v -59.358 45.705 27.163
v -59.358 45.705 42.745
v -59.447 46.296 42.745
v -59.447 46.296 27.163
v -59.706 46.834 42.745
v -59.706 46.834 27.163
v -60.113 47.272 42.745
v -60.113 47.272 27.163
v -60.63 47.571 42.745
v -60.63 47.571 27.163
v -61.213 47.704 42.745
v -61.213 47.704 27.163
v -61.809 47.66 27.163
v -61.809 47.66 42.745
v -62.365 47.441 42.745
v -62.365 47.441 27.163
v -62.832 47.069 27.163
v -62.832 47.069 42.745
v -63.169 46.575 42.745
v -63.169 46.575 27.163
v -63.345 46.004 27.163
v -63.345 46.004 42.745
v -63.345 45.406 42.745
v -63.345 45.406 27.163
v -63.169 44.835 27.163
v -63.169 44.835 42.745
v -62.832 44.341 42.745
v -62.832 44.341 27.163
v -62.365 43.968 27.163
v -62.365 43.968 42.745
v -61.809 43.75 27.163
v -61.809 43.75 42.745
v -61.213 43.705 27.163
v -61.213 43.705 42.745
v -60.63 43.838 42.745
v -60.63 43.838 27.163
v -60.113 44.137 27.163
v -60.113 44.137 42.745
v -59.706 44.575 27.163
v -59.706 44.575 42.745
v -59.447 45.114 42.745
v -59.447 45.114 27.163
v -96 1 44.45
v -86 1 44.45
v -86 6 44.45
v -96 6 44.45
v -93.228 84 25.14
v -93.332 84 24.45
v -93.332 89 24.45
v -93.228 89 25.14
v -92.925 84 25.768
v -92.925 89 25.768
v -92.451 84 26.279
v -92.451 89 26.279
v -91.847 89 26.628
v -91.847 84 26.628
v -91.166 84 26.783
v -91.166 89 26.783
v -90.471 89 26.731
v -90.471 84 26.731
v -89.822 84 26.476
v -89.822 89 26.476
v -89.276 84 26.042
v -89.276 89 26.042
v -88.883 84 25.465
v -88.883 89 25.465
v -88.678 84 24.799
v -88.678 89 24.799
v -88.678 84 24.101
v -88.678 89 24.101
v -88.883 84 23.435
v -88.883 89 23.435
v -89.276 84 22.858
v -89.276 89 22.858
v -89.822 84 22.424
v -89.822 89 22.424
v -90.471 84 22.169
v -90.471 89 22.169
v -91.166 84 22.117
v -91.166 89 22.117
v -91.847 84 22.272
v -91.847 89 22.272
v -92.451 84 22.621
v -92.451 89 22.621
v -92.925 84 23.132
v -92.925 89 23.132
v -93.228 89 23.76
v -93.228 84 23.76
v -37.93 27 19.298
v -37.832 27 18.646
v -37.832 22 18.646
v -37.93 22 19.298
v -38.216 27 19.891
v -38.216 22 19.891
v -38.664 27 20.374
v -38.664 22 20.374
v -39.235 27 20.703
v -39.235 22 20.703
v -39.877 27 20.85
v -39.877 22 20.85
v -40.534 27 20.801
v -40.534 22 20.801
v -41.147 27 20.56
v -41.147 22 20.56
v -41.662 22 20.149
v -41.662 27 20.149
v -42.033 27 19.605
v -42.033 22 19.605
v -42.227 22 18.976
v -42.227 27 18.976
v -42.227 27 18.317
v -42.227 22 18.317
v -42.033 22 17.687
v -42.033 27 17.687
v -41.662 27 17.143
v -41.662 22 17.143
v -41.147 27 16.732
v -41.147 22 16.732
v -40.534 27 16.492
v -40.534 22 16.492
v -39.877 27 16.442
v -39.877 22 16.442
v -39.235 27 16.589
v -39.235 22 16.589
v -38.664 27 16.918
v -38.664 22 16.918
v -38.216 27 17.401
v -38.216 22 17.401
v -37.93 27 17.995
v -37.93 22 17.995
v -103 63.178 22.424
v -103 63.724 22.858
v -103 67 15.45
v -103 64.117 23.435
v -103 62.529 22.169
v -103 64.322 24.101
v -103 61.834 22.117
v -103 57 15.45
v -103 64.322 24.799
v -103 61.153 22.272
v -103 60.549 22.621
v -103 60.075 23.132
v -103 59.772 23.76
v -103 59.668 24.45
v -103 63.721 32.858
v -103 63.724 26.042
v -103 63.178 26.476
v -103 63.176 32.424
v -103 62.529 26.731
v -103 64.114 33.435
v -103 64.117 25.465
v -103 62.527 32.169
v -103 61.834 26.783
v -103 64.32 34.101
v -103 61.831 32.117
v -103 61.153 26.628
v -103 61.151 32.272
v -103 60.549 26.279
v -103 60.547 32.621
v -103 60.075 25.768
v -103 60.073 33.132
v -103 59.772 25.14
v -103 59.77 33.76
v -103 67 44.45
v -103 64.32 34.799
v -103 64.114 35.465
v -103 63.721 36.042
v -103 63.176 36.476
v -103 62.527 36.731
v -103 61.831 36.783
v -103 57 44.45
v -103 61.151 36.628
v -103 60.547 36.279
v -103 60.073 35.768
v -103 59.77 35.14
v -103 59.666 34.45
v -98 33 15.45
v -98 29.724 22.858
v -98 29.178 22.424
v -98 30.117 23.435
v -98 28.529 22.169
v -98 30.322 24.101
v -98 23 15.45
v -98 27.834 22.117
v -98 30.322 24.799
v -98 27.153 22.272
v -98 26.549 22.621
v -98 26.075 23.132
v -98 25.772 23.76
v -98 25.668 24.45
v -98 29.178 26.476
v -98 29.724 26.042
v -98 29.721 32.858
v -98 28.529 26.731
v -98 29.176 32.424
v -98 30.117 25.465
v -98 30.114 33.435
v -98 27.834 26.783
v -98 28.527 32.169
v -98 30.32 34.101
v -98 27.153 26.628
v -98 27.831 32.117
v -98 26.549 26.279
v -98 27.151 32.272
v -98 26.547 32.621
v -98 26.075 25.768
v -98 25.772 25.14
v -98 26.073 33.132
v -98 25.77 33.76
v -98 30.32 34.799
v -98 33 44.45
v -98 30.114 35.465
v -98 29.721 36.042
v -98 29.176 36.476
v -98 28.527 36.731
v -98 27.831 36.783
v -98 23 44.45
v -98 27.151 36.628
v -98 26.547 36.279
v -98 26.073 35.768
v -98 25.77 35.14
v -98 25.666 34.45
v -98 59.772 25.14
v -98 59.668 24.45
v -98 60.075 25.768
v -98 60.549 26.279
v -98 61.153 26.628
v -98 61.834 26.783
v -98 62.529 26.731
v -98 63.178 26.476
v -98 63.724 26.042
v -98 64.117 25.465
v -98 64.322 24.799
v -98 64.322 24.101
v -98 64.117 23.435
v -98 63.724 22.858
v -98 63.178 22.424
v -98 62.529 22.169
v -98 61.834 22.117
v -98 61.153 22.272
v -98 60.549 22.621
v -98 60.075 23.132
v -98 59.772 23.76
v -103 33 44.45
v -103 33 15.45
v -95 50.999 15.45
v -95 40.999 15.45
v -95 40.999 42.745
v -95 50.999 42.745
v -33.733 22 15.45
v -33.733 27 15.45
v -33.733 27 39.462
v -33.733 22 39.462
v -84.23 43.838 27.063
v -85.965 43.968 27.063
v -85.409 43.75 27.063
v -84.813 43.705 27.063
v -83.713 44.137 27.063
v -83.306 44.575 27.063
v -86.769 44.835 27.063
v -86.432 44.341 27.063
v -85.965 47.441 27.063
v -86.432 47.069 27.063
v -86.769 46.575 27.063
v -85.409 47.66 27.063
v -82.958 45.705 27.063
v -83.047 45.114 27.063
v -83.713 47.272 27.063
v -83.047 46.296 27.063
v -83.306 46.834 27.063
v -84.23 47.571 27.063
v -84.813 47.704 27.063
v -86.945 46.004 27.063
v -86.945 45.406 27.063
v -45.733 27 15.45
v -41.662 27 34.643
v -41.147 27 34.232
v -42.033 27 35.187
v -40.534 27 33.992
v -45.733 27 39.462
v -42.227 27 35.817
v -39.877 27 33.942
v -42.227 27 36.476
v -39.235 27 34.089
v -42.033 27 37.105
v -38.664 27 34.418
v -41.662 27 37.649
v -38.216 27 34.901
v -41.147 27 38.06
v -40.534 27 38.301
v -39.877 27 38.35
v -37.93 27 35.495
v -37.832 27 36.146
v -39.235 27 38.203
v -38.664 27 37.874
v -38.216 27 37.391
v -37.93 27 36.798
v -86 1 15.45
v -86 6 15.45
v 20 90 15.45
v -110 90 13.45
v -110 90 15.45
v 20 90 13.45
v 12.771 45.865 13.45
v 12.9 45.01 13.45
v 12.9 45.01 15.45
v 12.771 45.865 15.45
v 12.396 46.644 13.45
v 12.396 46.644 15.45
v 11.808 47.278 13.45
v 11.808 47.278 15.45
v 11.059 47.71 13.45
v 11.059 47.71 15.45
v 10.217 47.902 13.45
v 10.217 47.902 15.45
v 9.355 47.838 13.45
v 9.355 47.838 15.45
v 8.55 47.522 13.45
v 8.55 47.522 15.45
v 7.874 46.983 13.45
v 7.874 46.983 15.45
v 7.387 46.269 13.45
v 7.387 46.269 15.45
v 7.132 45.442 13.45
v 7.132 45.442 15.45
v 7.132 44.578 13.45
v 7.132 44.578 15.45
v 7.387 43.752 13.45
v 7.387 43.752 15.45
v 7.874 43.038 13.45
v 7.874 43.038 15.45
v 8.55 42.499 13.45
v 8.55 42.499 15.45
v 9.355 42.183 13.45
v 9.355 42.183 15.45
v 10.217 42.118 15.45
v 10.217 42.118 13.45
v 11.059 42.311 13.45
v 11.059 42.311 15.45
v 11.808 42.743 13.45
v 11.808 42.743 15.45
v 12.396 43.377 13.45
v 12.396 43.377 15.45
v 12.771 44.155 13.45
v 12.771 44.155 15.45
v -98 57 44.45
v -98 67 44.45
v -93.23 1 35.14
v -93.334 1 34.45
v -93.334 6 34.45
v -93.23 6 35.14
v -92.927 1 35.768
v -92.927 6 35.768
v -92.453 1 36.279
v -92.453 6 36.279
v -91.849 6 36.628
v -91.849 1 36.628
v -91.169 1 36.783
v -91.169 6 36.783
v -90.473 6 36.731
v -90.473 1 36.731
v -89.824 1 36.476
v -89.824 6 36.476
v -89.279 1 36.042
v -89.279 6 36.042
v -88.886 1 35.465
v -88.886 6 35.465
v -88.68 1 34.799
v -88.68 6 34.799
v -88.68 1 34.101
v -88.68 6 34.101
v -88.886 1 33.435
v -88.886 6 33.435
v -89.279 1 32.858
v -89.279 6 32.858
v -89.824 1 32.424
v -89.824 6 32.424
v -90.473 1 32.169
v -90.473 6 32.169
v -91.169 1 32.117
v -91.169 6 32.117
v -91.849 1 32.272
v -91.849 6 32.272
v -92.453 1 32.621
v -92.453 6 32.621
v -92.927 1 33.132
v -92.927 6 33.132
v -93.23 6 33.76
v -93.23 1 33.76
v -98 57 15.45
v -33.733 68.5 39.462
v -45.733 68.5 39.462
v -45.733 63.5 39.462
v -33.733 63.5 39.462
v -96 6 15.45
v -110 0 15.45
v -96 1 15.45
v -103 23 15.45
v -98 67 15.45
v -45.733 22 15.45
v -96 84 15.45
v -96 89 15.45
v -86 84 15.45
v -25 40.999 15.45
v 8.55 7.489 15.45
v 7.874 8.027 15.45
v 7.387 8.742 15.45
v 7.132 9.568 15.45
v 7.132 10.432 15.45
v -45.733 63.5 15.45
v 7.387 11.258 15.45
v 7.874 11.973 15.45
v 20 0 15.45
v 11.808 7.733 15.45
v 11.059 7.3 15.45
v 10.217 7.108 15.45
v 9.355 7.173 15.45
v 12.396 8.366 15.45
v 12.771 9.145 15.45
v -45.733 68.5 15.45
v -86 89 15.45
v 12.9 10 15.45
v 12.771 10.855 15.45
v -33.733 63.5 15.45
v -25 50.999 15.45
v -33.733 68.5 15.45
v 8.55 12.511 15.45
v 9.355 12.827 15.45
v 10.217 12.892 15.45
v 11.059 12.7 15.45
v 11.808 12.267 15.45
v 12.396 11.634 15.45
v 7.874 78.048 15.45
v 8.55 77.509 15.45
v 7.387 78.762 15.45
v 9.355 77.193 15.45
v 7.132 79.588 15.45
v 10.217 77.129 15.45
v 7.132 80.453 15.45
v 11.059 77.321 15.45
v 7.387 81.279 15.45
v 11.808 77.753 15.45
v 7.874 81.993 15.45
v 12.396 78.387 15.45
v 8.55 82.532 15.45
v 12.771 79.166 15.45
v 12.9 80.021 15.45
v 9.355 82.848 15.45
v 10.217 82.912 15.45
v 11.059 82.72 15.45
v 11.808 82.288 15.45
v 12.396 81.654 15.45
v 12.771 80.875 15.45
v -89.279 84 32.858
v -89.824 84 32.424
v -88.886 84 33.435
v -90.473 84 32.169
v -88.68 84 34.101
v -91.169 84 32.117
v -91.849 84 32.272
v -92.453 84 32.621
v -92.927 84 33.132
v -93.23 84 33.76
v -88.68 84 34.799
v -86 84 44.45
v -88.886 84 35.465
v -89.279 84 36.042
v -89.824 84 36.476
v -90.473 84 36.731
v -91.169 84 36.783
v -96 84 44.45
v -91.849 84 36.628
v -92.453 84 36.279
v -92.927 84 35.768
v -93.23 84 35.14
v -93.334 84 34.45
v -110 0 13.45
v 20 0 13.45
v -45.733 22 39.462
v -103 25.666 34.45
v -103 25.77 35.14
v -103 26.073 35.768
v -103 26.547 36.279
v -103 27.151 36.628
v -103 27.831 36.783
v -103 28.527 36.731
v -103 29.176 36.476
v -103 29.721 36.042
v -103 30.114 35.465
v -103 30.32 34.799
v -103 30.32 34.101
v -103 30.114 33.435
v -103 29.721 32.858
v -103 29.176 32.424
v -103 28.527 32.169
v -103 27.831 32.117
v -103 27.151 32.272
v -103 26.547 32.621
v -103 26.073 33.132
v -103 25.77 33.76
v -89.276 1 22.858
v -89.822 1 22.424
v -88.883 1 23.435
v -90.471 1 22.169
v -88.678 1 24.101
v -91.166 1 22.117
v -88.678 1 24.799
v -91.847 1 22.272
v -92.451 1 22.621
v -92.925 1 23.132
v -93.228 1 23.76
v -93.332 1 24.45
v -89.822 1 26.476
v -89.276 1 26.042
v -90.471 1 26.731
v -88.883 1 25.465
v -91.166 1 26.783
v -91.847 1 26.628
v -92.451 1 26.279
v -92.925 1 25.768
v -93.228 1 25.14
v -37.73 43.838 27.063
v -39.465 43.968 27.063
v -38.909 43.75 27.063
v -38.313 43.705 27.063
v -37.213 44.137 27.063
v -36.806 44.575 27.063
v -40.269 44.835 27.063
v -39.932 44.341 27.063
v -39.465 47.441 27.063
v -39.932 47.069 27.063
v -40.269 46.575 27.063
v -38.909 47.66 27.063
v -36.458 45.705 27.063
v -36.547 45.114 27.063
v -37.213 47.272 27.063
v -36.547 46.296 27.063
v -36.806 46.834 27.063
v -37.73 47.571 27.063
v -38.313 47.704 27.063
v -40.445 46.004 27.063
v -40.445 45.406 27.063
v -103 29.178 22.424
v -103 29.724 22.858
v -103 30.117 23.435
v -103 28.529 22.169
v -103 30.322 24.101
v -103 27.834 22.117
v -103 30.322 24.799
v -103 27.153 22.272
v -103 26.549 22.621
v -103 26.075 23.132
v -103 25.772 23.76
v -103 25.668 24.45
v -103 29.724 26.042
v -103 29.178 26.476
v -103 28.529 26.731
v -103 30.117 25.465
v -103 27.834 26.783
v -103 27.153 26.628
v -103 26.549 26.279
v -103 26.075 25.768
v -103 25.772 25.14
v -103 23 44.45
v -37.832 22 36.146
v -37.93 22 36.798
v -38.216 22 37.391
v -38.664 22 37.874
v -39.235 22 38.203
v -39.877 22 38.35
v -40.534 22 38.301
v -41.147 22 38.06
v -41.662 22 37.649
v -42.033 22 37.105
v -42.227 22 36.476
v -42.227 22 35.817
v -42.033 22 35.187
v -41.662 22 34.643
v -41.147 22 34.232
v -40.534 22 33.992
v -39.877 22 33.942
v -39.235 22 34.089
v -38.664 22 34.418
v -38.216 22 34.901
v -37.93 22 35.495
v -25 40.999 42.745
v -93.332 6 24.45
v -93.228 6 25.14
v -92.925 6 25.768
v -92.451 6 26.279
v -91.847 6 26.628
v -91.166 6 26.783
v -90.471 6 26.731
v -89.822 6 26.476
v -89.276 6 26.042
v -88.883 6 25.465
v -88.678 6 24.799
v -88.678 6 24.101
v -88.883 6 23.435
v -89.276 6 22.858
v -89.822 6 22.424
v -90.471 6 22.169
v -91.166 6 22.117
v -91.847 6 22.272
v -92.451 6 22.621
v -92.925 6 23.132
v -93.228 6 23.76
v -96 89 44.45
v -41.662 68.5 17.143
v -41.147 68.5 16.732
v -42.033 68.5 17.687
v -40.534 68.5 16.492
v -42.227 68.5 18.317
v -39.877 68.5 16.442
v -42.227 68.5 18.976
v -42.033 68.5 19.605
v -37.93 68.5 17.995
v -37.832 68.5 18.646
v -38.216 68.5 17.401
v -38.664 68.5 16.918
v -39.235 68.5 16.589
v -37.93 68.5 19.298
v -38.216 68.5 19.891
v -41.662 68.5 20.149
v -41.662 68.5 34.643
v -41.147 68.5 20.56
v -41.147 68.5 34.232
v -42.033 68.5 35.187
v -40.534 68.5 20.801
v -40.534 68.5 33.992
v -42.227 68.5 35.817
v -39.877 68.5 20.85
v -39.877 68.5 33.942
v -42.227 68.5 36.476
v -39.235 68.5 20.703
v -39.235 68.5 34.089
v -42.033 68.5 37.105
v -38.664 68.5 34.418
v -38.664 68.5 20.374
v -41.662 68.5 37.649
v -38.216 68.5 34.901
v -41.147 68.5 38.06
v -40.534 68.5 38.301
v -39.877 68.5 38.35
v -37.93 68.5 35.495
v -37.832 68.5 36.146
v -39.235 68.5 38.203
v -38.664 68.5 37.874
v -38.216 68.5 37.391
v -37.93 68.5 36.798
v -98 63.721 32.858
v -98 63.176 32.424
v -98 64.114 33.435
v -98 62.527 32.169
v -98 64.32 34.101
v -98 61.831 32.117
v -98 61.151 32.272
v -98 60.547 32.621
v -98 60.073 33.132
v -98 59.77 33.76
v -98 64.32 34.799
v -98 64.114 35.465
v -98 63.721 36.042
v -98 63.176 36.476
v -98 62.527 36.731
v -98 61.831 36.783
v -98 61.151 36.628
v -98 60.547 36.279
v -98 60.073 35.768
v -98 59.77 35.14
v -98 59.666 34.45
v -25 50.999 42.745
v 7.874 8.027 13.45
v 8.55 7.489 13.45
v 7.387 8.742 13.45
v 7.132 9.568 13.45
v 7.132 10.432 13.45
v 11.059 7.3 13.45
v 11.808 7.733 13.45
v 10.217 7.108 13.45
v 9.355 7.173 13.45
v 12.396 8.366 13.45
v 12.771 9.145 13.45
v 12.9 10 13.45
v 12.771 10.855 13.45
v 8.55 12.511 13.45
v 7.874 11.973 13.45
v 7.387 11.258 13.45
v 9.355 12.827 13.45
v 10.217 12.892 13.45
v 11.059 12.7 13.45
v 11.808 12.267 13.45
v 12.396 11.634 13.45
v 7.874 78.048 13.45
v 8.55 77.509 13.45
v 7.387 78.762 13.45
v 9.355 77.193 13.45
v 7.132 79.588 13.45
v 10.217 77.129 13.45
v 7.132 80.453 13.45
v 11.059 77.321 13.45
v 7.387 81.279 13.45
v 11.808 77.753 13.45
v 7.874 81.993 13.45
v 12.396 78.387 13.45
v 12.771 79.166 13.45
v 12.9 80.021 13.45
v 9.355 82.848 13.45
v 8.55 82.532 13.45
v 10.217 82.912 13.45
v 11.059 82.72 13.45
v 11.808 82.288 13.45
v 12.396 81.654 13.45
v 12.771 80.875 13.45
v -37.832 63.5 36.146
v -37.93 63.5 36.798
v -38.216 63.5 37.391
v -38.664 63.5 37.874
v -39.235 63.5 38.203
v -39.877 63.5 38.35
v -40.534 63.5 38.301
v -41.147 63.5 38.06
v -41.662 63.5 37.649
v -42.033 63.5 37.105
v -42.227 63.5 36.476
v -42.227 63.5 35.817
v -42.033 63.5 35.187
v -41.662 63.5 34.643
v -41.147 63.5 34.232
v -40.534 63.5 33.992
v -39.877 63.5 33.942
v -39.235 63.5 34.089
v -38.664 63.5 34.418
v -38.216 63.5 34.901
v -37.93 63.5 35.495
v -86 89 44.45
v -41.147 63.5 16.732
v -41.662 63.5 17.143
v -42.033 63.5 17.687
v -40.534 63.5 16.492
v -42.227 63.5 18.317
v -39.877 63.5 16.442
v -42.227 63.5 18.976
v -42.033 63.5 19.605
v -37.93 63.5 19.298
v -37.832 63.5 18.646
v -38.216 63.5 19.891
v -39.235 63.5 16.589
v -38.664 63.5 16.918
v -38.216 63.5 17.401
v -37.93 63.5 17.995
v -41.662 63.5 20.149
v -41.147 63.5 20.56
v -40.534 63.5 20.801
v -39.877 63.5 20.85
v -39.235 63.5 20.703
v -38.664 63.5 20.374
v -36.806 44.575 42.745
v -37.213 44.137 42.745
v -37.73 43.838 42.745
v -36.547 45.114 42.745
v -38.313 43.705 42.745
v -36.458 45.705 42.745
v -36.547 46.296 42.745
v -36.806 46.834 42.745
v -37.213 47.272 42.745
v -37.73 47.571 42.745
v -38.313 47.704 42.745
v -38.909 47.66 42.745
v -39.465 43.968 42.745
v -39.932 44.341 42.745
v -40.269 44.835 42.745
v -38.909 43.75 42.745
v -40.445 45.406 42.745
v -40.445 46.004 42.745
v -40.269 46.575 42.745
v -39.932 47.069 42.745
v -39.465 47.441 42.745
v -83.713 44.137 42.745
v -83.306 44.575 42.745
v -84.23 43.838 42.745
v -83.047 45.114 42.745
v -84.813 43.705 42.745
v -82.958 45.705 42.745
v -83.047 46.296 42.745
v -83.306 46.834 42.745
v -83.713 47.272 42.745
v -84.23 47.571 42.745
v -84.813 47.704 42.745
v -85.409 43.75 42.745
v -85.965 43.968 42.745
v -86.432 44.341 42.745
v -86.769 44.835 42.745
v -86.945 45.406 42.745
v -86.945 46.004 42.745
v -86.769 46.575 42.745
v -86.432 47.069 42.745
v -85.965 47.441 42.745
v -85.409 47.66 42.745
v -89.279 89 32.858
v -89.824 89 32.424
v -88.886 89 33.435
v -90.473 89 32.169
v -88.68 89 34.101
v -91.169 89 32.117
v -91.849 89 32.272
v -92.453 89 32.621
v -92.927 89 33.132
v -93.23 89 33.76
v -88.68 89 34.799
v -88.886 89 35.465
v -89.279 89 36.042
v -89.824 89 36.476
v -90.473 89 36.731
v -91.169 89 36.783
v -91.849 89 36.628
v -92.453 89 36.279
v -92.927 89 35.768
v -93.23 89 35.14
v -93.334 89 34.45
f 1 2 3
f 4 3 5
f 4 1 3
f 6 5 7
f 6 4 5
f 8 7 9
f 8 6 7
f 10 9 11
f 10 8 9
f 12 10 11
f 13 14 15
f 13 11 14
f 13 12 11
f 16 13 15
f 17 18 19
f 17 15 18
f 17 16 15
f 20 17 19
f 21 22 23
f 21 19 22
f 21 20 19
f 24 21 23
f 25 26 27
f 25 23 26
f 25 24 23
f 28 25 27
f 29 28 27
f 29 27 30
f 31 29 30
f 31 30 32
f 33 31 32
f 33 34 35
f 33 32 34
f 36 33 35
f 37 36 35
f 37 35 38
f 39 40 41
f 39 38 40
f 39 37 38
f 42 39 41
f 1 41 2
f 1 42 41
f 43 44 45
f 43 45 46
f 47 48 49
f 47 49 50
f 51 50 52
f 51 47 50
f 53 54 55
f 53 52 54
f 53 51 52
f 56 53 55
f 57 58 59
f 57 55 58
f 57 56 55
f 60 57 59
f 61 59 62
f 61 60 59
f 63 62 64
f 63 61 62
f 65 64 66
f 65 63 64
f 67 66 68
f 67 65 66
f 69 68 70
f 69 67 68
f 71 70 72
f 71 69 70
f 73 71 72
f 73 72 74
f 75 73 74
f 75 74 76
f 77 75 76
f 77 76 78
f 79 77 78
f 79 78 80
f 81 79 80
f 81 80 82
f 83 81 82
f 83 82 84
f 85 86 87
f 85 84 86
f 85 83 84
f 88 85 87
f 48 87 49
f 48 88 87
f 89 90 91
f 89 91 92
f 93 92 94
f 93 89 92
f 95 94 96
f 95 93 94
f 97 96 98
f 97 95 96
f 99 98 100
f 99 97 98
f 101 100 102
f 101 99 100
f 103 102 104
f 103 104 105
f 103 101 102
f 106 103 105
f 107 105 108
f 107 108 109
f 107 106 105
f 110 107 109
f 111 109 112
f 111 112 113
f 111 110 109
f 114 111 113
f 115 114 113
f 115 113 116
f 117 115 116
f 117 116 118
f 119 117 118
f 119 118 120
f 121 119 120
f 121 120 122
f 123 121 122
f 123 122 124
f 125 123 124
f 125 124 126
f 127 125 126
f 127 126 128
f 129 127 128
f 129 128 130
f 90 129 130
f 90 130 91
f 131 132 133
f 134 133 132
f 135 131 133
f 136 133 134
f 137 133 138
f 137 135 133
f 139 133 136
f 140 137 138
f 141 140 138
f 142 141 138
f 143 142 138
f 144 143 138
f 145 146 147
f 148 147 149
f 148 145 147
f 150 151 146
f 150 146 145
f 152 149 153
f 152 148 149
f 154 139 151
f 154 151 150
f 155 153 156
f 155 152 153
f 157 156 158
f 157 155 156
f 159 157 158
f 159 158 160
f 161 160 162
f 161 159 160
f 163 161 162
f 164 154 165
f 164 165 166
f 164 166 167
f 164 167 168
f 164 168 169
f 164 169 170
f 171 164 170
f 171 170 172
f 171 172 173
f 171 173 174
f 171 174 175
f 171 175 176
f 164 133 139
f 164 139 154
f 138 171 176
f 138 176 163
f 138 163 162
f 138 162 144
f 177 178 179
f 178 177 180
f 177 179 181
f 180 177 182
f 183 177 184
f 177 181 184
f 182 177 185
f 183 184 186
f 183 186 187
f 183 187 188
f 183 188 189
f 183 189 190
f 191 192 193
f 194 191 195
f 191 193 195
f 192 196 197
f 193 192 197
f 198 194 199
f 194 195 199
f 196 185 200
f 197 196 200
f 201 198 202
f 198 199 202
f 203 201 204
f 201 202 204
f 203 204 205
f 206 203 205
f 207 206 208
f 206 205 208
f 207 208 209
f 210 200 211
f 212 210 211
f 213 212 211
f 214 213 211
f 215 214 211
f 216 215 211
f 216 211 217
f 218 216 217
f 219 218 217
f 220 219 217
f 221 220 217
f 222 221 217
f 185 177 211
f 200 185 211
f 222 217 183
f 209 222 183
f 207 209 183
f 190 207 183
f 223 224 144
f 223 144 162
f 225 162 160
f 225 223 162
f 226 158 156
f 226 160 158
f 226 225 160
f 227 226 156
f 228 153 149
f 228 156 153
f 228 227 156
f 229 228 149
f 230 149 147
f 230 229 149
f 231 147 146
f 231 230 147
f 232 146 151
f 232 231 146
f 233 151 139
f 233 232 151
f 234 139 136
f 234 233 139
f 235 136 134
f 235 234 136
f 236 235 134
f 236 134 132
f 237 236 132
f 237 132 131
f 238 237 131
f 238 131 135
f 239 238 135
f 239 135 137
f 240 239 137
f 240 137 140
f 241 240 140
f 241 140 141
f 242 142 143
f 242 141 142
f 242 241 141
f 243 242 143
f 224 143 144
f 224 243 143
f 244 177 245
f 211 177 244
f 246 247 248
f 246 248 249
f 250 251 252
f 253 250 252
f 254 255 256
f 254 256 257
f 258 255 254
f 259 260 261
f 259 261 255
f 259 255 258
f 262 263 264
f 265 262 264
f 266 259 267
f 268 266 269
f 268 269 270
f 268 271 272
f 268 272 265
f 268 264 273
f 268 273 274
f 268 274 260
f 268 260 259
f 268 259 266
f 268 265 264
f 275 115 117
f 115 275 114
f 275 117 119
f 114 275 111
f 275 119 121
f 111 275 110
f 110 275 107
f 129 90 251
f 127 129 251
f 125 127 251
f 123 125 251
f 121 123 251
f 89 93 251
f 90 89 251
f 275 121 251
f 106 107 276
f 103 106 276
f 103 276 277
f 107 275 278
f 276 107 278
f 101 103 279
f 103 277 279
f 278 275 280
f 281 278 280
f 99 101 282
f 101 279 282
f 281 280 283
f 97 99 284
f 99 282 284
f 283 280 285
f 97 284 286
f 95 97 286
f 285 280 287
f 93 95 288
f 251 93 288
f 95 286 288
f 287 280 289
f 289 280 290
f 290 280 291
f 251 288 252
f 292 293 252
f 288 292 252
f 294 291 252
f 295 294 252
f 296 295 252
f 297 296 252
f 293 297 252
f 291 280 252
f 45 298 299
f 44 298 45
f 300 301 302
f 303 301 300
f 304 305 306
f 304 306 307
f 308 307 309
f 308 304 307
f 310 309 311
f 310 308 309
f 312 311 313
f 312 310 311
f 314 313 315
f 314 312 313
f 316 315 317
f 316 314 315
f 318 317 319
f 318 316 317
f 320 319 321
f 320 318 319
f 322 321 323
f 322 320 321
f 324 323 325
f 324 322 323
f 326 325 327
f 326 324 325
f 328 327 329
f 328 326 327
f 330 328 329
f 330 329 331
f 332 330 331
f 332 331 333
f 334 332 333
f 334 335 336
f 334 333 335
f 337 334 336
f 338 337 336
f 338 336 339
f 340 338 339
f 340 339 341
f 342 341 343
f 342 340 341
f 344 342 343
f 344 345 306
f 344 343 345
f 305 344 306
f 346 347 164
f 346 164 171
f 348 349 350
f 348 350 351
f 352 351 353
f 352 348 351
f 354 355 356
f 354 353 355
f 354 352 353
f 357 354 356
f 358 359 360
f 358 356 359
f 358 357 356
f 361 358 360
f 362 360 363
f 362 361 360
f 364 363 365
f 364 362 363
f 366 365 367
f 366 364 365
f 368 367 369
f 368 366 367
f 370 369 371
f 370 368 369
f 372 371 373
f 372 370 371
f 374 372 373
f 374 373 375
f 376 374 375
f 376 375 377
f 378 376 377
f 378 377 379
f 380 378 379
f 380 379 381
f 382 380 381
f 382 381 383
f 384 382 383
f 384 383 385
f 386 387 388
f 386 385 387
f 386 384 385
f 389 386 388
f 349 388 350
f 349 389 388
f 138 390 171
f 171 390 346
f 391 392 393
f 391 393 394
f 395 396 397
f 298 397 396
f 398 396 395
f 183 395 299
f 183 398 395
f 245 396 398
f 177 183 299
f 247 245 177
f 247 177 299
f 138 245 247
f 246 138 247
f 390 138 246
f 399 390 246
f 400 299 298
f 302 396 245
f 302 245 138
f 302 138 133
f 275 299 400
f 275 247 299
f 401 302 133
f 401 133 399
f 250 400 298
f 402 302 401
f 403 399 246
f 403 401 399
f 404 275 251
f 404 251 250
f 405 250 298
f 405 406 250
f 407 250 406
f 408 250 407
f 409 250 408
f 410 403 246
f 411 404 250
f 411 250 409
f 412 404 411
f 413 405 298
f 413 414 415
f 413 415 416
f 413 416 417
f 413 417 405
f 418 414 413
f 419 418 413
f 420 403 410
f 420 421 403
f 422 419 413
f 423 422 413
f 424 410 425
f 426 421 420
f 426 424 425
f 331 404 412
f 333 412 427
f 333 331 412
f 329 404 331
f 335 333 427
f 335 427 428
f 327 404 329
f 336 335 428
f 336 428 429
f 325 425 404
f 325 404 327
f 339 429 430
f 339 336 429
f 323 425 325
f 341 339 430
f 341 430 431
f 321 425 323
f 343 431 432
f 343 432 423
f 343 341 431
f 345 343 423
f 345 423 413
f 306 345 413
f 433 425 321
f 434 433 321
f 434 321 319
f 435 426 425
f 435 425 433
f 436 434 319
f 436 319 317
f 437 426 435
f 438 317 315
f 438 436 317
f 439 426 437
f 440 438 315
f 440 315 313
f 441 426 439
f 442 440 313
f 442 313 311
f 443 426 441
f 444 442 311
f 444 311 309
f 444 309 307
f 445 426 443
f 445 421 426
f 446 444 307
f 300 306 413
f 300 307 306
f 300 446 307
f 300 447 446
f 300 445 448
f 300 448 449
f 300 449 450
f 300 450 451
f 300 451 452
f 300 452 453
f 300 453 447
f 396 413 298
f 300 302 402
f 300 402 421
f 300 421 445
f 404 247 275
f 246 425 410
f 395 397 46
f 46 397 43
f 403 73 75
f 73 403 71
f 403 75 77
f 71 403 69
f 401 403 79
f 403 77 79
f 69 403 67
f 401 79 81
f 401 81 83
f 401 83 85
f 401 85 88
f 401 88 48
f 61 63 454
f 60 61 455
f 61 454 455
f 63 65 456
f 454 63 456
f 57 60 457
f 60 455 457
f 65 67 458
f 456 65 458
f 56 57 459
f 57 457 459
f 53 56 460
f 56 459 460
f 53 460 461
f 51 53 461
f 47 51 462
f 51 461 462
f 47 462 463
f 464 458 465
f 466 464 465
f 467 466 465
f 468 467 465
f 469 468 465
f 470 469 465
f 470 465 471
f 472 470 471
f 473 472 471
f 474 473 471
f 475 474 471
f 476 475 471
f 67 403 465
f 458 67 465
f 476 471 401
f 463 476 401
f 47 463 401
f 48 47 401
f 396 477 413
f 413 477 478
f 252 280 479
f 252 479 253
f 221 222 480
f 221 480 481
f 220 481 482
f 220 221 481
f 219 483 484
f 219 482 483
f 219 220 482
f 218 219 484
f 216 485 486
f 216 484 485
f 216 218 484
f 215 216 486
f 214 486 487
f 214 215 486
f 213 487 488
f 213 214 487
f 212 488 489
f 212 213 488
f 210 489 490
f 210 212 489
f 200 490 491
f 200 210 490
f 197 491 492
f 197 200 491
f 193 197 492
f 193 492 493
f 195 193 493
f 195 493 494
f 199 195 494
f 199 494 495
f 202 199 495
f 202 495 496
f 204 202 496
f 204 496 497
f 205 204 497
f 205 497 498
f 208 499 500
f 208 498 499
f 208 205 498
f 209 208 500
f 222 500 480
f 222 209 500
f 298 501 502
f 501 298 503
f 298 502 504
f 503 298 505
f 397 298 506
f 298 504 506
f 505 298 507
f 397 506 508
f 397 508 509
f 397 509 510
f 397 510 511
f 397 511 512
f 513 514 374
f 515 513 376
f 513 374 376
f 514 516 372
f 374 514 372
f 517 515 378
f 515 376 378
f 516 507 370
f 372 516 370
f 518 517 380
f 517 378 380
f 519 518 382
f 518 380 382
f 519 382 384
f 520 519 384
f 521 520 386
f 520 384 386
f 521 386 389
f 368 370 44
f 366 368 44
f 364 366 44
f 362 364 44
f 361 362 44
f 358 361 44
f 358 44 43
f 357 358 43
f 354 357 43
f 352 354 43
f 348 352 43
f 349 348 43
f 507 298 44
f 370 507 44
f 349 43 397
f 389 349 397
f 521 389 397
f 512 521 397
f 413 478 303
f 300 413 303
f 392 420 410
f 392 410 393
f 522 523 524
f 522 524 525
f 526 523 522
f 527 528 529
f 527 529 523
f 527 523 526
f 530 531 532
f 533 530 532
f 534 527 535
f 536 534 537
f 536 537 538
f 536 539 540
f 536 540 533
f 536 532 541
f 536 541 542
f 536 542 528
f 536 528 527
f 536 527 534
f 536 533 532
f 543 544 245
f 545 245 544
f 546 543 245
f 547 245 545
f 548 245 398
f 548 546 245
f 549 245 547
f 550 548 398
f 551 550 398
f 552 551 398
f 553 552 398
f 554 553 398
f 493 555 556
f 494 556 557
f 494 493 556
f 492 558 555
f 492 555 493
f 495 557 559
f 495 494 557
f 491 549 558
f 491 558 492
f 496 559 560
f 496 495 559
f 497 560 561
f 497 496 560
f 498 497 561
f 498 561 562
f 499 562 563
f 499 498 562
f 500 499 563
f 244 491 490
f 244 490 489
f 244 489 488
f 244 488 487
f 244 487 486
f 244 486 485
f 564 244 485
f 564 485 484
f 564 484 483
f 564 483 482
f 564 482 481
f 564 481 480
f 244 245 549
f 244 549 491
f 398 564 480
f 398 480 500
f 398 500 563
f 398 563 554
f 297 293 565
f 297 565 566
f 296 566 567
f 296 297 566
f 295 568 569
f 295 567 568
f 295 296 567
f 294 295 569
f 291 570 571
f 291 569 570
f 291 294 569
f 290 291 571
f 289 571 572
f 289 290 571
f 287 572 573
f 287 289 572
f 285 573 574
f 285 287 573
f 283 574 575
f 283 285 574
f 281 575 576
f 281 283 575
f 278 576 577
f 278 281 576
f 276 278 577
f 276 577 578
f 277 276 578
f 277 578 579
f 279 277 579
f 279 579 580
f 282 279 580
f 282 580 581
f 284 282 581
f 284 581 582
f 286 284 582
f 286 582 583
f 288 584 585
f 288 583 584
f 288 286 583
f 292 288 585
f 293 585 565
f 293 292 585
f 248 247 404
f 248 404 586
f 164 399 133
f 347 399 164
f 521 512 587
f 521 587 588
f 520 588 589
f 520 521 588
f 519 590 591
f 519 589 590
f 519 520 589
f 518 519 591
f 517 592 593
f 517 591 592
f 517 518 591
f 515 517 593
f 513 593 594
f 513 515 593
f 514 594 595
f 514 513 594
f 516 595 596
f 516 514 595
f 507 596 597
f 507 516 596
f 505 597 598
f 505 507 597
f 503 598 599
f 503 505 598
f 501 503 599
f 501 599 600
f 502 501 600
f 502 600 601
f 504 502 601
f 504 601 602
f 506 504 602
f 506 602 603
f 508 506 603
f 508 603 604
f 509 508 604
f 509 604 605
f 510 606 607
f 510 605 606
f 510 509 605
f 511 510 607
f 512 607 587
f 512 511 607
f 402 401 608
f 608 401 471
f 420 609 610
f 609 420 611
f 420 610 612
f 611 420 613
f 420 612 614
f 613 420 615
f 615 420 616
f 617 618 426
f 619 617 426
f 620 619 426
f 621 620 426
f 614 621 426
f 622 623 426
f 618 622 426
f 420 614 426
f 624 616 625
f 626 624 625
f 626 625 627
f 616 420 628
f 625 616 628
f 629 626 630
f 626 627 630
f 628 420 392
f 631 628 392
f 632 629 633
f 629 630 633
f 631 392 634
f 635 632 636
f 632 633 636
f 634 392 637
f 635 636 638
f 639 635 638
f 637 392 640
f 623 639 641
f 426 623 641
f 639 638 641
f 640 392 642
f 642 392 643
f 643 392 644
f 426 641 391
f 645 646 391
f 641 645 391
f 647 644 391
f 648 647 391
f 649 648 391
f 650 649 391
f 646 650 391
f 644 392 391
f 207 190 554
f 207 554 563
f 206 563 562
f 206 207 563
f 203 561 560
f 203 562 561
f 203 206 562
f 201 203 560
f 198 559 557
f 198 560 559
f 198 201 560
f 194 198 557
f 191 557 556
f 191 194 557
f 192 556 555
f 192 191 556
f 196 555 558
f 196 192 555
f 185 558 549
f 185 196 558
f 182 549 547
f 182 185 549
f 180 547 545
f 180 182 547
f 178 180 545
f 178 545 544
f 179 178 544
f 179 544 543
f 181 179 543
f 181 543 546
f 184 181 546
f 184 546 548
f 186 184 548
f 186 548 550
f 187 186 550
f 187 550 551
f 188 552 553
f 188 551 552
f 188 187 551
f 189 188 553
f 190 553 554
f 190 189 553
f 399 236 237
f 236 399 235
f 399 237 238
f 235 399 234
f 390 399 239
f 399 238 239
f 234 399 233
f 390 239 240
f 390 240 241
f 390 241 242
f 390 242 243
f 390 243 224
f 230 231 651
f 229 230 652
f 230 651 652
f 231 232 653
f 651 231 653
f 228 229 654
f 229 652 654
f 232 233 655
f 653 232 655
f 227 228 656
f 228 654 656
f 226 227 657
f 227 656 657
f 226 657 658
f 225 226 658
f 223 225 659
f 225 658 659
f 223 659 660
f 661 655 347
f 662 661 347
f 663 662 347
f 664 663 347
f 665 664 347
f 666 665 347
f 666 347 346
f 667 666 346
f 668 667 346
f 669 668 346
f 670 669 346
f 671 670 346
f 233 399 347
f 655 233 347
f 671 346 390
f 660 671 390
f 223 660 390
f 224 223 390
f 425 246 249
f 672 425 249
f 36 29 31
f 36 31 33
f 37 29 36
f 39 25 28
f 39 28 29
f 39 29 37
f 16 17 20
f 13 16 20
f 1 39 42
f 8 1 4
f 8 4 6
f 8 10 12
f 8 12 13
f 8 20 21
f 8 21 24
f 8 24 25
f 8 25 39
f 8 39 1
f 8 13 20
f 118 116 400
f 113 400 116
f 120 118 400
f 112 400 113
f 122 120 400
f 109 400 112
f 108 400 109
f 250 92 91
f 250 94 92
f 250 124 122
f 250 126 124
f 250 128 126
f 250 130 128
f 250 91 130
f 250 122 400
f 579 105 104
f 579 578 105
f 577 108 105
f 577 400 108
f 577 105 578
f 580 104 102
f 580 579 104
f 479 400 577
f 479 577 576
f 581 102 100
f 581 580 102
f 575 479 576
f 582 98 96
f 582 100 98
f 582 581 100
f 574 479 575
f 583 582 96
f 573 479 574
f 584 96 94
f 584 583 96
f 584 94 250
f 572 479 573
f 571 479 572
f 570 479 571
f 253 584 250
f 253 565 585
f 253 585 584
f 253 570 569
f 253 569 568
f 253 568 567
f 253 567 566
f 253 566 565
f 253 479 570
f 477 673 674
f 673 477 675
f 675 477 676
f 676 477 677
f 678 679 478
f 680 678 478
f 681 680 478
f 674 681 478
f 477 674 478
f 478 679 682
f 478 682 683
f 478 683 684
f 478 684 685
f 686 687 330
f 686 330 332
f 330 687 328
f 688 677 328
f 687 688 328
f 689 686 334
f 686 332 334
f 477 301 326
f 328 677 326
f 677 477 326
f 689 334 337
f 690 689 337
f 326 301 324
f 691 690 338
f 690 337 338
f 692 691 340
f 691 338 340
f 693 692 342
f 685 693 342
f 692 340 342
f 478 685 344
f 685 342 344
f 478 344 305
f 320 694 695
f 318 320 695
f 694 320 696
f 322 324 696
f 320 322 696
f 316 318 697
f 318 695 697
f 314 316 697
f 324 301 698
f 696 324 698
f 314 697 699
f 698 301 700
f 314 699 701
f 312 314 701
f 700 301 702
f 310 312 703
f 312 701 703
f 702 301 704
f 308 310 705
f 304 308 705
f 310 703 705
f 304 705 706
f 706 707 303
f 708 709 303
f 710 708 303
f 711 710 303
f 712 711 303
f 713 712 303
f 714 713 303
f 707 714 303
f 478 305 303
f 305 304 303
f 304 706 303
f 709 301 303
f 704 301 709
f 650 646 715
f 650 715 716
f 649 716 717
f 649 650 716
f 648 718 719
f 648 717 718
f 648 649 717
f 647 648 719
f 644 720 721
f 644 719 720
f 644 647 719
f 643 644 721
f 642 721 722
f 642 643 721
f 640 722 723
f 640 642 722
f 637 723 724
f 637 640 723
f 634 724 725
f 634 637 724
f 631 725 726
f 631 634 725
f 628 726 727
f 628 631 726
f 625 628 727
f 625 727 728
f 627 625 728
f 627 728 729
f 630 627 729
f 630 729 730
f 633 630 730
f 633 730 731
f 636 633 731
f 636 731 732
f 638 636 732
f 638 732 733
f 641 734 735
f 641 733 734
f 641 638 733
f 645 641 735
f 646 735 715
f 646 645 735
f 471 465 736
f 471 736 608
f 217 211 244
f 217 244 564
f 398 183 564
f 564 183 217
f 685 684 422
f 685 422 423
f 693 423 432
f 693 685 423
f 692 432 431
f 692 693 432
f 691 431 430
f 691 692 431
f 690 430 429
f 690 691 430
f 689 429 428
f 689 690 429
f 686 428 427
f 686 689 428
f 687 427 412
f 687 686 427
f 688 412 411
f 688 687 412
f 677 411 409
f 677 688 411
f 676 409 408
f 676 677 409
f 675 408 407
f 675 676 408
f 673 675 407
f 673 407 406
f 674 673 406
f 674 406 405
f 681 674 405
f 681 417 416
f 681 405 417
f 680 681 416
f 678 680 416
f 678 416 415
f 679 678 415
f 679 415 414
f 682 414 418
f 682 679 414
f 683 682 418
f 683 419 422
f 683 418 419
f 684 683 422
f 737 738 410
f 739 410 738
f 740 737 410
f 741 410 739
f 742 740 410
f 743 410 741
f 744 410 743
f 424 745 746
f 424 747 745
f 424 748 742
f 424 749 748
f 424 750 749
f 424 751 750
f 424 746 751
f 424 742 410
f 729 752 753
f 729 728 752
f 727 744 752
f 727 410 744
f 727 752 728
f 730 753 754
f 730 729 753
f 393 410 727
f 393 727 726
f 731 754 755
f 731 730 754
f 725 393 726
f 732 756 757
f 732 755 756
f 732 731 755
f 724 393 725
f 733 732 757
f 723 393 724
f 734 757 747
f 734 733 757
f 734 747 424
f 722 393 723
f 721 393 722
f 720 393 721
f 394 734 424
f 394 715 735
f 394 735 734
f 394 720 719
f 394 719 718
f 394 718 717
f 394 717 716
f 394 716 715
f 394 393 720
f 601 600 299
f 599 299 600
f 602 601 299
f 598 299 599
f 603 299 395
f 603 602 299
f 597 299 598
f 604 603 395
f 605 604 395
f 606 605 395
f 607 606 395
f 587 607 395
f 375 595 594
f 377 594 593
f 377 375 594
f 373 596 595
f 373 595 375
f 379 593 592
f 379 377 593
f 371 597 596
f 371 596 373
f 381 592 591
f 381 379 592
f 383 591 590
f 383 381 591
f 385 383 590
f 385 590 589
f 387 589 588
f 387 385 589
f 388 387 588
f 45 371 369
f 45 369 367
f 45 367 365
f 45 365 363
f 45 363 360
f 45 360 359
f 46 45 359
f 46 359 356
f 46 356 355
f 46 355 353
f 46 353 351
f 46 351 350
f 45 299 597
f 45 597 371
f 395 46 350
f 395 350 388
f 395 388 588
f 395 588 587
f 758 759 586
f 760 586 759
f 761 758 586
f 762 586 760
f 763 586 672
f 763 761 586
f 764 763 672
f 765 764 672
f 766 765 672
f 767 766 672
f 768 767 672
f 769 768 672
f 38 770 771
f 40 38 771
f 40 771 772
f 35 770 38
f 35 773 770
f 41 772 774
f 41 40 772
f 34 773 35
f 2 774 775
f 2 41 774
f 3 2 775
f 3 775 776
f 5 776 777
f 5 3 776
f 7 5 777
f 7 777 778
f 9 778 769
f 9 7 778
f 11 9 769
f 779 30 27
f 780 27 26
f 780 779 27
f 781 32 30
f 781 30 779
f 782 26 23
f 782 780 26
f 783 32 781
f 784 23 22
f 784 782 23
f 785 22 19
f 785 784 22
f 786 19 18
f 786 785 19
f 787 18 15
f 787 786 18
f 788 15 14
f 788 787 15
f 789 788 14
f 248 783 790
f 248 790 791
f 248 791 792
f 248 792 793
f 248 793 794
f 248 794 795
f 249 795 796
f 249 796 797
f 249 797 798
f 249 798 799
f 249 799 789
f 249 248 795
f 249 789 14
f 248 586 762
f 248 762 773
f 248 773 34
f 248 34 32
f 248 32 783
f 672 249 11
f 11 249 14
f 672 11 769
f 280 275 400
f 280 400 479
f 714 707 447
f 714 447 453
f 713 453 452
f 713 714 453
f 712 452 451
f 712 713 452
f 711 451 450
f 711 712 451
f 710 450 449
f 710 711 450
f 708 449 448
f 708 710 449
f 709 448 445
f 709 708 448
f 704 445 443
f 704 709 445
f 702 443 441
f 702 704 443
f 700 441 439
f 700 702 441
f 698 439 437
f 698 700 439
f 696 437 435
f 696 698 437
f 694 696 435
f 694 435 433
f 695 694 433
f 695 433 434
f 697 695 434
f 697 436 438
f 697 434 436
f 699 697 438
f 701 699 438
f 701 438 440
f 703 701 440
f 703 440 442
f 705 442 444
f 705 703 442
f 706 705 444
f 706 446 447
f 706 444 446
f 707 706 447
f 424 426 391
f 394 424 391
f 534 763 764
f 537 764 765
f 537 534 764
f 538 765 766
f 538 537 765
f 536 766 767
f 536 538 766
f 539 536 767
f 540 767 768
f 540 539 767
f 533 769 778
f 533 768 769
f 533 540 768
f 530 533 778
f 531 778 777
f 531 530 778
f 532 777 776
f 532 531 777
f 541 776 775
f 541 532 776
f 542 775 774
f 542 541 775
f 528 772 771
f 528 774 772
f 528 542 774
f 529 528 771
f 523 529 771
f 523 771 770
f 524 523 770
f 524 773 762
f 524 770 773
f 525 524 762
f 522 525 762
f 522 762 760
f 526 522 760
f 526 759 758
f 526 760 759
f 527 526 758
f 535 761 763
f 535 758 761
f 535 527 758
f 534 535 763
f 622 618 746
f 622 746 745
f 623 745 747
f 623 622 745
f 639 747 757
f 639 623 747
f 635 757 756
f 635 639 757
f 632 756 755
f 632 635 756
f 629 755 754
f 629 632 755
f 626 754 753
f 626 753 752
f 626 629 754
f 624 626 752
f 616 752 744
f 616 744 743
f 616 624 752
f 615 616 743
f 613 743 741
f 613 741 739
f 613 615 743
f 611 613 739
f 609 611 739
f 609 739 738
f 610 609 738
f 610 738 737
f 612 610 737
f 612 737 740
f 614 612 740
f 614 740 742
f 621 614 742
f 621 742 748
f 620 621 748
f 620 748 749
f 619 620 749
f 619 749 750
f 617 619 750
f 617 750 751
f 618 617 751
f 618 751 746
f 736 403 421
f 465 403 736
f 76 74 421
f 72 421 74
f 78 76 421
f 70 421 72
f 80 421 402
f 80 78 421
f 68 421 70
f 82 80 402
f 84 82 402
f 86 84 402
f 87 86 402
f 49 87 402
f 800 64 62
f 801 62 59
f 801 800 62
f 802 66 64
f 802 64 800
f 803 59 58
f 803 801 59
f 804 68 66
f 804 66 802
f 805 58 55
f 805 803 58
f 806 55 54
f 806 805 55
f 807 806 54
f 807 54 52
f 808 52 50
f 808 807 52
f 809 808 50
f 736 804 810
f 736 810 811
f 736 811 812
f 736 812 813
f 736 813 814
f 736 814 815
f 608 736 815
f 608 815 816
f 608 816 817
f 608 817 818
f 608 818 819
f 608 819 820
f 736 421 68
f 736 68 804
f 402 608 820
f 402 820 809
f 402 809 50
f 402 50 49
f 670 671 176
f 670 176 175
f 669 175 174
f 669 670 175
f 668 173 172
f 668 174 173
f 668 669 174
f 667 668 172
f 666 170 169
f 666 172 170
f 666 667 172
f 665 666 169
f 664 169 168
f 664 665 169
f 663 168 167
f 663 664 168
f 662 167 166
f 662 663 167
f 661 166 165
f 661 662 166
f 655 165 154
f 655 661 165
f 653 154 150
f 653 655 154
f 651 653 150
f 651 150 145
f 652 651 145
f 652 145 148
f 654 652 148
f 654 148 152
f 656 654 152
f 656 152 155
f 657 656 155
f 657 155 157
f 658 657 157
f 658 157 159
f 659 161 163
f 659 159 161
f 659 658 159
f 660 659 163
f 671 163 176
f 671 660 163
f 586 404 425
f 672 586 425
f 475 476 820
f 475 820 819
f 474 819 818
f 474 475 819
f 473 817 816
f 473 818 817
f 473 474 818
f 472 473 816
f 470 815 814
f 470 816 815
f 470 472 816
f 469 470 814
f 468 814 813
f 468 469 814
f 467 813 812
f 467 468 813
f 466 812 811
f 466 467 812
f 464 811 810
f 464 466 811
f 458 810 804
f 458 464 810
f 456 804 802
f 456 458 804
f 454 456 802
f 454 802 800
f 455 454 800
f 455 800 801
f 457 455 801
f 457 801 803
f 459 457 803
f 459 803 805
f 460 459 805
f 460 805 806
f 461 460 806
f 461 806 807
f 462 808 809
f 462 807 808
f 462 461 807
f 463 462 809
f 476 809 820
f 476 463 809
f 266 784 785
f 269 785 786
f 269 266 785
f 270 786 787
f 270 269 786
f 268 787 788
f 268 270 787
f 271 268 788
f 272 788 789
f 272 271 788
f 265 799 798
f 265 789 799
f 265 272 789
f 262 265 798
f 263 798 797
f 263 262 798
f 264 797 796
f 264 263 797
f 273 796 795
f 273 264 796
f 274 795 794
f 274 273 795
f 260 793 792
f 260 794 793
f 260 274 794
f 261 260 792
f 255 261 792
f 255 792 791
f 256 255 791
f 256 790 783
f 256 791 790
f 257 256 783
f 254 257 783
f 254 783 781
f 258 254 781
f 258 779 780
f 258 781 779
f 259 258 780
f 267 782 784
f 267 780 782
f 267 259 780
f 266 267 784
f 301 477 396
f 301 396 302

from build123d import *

# Parameters (mm, degrees)
SKETCH169_R                = 2.34
EXTRUDE089_DEPTH           = 20
SKETCH168_W                = 10
SKETCH168_H                = 30
EXTRUDE088_DEPTH           = 5
EXTRUDE088_PLACEMENT_ANGLE = 90
CUT055_PLACEMENT_ANGLE     = 90
SKETCH165_R                = 2.34
EXTRUDE085_DEPTH           = 20
SKETCH164_W                = 10
SKETCH164_H                = 30
EXTRUDE084_DEPTH           = 5
EXTRUDE084_PLACEMENT_ANGLE = 90
SKETCH082_R                = 2.21
EXTRUDE103_DEPTH           = 10
SKETCH081_R                = 2.21
EXTRUDE102_DEPTH           = 10
SKETCH080_W                = 12
SKETCH080_H                = 26.01178
EXTRUDE101_DEPTH           = 5
SKETCH079_R                = 2.21
EXTRUDE100_DEPTH           = 10
SKETCH078_R                = 2.21
EXTRUDE099_DEPTH           = 10
SKETCH077_W                = 12
SKETCH077_H                = 26.01178
EXTRUDE098_DEPTH           = 5
SKETCH167_R                = 2.34
EXTRUDE087_DEPTH           = 20
SKETCH166_W                = 10
SKETCH166_H                = 30
EXTRUDE086_DEPTH           = 5
EXTRUDE086_PLACEMENT_ANGLE = 90
CUT052_PLACEMENT_ANGLE     = 90
SKETCH163_R                = 2.34
EXTRUDE083_DEPTH           = 20
SKETCH162_W                = 10
SKETCH162_H                = 30
EXTRUDE082_DEPTH           = 5
EXTRUDE082_PLACEMENT_ANGLE = 90
SKETCH016_R                = 2.005
EXTRUDE077_DEPTH           = 20
EXTRUDE076_DEPTH           = 20
EXTRUDE075_DEPTH           = 20
SKETCH161_W                = 10
SKETCH161_H                = 27.36
EXTRUDE182_DEPTH           = 70
SKETCH075_R                = 2.9
EXTRUDE091_DEPTH           = 50
SKETCH074_W                = 130
SKETCH074_H                = 90
EXTRUDE090_DEPTH           = 2


with BuildPart() as tornillos050:
    # Sketch169 (on Face6 of Extrude088) → Extrude089 (new body)
    with BuildSketch(Plane(origin=(-101, -107, 0), x_dir=(0, -1, 0), z_dir=(-1, 0, 0))):
        with Locations((-135.006037, 30)):
            Circle(SKETCH169_R)
        with Locations((-135.008375, 20)):
            Circle(SKETCH169_R)
    extrude(amount=EXTRUDE089_DEPTH)


with BuildPart() as tornillos050_1:
    # Extrude089 placement: moved
    add(tornillos050.part.moved(Location((17, 0, 0))))


with BuildPart() as soporte016:
    # Sketch168 → Extrude088 (new body)
    with BuildSketch(Plane.XZ):
        with Locations((-135, 25)):
            Rectangle(SKETCH168_W, SKETCH168_H)
    extrude(amount=EXTRUDE088_DEPTH)


with BuildPart() as soporte016_1:
    # Extrude088 placement: moved
    add(soporte016.part.moved(Location((-96, -107, 0))).rotate(Axis((-96, -107, 0), (0, 0, -1)), EXTRUDE088_PLACEMENT_ANGLE))

    # Cut055: cut Tornillos050
    add(tornillos050_1.part, mode=Mode.SUBTRACT)


with BuildPart() as soporte016_2:
    # Cut055 placement: moved
    add(soporte016_1.part.moved(Location((-119, -12, -3))).rotate(Axis((-119, -12, -3), (0, 0, -1)), CUT055_PLACEMENT_ANGLE))


with BuildPart() as tornillos048:
    # Sketch165 (on Face6 of Extrude084) → Extrude085 (new body)
    with BuildSketch(Plane(origin=(-101, -107, 0), x_dir=(0, -1, 0), z_dir=(-1, 0, 0))):
        with Locations((-135.006037, 30)):
            Circle(SKETCH165_R)
        with Locations((-135.008375, 20)):
            Circle(SKETCH165_R)
    extrude(amount=EXTRUDE085_DEPTH)


with BuildPart() as tornillos048_1:
    # Extrude085 placement: moved
    add(tornillos048.part.moved(Location((17, 0, 0))))


with BuildPart() as soporte015:
    # Sketch164 → Extrude084 (new body)
    with BuildSketch(Plane.XZ):
        with Locations((-135, 25)):
            Rectangle(SKETCH164_W, SKETCH164_H)
    extrude(amount=EXTRUDE084_DEPTH)


with BuildPart() as soporte015_1:
    # Extrude084 placement: moved
    add(soporte015.part.moved(Location((-96, -107, 0))).rotate(Axis((-96, -107, 0), (0, 0, -1)), EXTRUDE084_PLACEMENT_ANGLE))

    # Cut054: cut Tornillos048
    add(tornillos048_1.part, mode=Mode.SUBTRACT)


with BuildPart() as soporte015_2:
    # Cut054 placement: moved
    add(soporte015_1.part.moved(Location((-2, 34, -3))))


with BuildPart() as extrude103:
    # Sketch082 → Extrude103 (new body)
    with BuildSketch(Plane.XZ):
        with Locations((-30.242167, 20.01615)):
            Circle(SKETCH082_R)
    extrude(amount=EXTRUDE103_DEPTH)


with BuildPart() as extrude103_1:
    # Extrude103 placement: moved
    add(extrude103.part.moved(Location((-9.8, 5, -14.82))))


with BuildPart() as extrude102:
    # Sketch081 → Extrude102 (new body)
    with BuildSketch(Plane.XZ):
        with Locations((-30.242167, 20.01615)):
            Circle(SKETCH081_R)
    extrude(amount=EXTRUDE102_DEPTH)


with BuildPart() as extrude102_1:
    # Extrude102 placement: moved
    add(extrude102.part.moved(Location((-9.8, 3, 2.68))))


with BuildPart() as cut059:
    # Sketch080 → Extrude101 (new body)
    with BuildSketch(Plane.XZ):
        with Locations((-39.733391, 13.00589)):
            Rectangle(SKETCH080_W, SKETCH080_H)
    extrude(amount=EXTRUDE101_DEPTH)

    # Cut058: cut Extrude102
    add(extrude102_1.part, mode=Mode.SUBTRACT)

    # Cut059: cut Extrude103
    add(extrude103_1.part, mode=Mode.SUBTRACT)


with BuildPart() as cut059_1:
    # Cut059 placement: moved
    add(cut059.part.moved(Location((0, 68.5, 6))))


with BuildPart() as extrude100:
    # Sketch079 → Extrude100 (new body)
    with BuildSketch(Plane.XZ):
        with Locations((-30.242167, 20.01615)):
            Circle(SKETCH079_R)
    extrude(amount=EXTRUDE100_DEPTH)


with BuildPart() as extrude100_1:
    # Extrude100 placement: moved
    add(extrude100.part.moved(Location((-9.8, 5, -14.82))))


with BuildPart() as extrude099:
    # Sketch078 → Extrude099 (new body)
    with BuildSketch(Plane.XZ):
        with Locations((-30.242167, 20.01615)):
            Circle(SKETCH078_R)
    extrude(amount=EXTRUDE099_DEPTH)


with BuildPart() as extrude099_1:
    # Extrude099 placement: moved
    add(extrude099.part.moved(Location((-9.8, 3, 2.68))))


with BuildPart() as cut057:
    # Sketch077 → Extrude098 (new body)
    with BuildSketch(Plane.XZ):
        with Locations((-39.733391, 13.00589)):
            Rectangle(SKETCH077_W, SKETCH077_H)
    extrude(amount=EXTRUDE098_DEPTH)

    # Cut056: cut Extrude099
    add(extrude099_1.part, mode=Mode.SUBTRACT)

    # Cut057: cut Extrude100
    add(extrude100_1.part, mode=Mode.SUBTRACT)


with BuildPart() as cut057_1:
    # Cut057 placement: moved
    add(cut057.part.moved(Location((0, 27, 6))))


with BuildPart() as tornillos049:
    # Sketch167 (on Face6 of Extrude086) → Extrude087 (new body)
    with BuildSketch(Plane(origin=(-101, -107, 0), x_dir=(0, -1, 0), z_dir=(-1, 0, 0))):
        with Locations((-135.006037, 30)):
            Circle(SKETCH167_R)
        with Locations((-135.008375, 20)):
            Circle(SKETCH167_R)
    extrude(amount=EXTRUDE087_DEPTH)


with BuildPart() as tornillos049_1:
    # Extrude087 placement: moved
    add(tornillos049.part.moved(Location((17, 0, 0))))


with BuildPart() as soporte013:
    # Sketch166 → Extrude086 (new body)
    with BuildSketch(Plane.XZ):
        with Locations((-135, 25)):
            Rectangle(SKETCH166_W, SKETCH166_H)
    extrude(amount=EXTRUDE086_DEPTH)


with BuildPart() as soporte013_1:
    # Extrude086 placement: moved
    add(soporte013.part.moved(Location((-96, -107, 0))).rotate(Axis((-96, -107, 0), (0, 0, -1)), EXTRUDE086_PLACEMENT_ANGLE))

    # Cut052: cut Tornillos049
    add(tornillos049_1.part, mode=Mode.SUBTRACT)


with BuildPart() as soporte013_2:
    # Cut052 placement: moved
    add(soporte013_1.part.moved(Location((-119, -95, -3))).rotate(Axis((-119, -95, -3), (0, 0, -1)), CUT052_PLACEMENT_ANGLE))


with BuildPart() as tornillos047:
    # Sketch163 (on Face6 of Extrude082) → Extrude083 (new body)
    with BuildSketch(Plane(origin=(-101, -107, 0), x_dir=(0, -1, 0), z_dir=(-1, 0, 0))):
        with Locations((-135.006037, 30)):
            Circle(SKETCH163_R)
        with Locations((-135.008375, 20)):
            Circle(SKETCH163_R)
    extrude(amount=EXTRUDE083_DEPTH)


with BuildPart() as tornillos047_1:
    # Extrude083 placement: moved
    add(tornillos047.part.moved(Location((17, 0, 0))))


with BuildPart() as soporte014:
    # Sketch162 → Extrude082 (new body)
    with BuildSketch(Plane.XZ):
        with Locations((-135, 25)):
            Rectangle(SKETCH162_W, SKETCH162_H)
    extrude(amount=EXTRUDE082_DEPTH)


with BuildPart() as soporte014_1:
    # Extrude082 placement: moved
    add(soporte014.part.moved(Location((-96, -107, 0))).rotate(Axis((-96, -107, 0), (0, 0, -1)), EXTRUDE082_PLACEMENT_ANGLE))

    # Cut053: cut Tornillos047
    add(tornillos047_1.part, mode=Mode.SUBTRACT)


with BuildPart() as soporte014_2:
    # Cut053 placement: moved
    add(soporte014_1.part.moved(Location((-2, 0, -3))))


with BuildPart() as tornillo018:
    # Sketch016 → Extrude077 (new body)
    with BuildSketch(Plane.XY.offset(45.913223)):
        with Locations((-84.962639, 67.504814)):
            Circle(SKETCH016_R)
    extrude(amount=EXTRUDE077_DEPTH)


with BuildPart() as tornillo018_1:
    # Extrude077 placement: moved
    add(tornillo018.part.moved(Location((46.5, -21.8, -26))))


with BuildPart() as tornillo017:
    # Sketch016 → Extrude076 (new body)
    with BuildSketch(Plane.XY.offset(45.913223)):
        with Locations((-84.962639, 67.504814)):
            Circle(SKETCH016_R)
    extrude(amount=EXTRUDE076_DEPTH)


with BuildPart() as tornillo017_1:
    # Extrude076 placement: moved
    add(tornillo017.part.moved(Location((23.6, -21.8, -25.9))))


with BuildPart() as tornillo016:
    # Sketch016 → Extrude075 (new body)
    with BuildSketch(Plane.XY.offset(45.913223)):
        with Locations((-84.962639, 67.504814)):
            Circle(SKETCH016_R)
    extrude(amount=EXTRUDE075_DEPTH)


with BuildPart() as tornillo016_1:
    # Extrude075 placement: moved
    add(tornillo016.part.moved(Location((0, -21.8, -26))))


with BuildPart() as bbbbbbbbb:
    # Sketch161 → Extrude182 (new body)
    with BuildSketch(Plane.YZ):
        with Locations((-10.400922, 22.215275)):
            Rectangle(SKETCH161_W, SKETCH161_H)
    extrude(amount=EXTRUDE182_DEPTH)


with BuildPart() as bbbbbbbbb_1:
    # Extrude182 placement: moved
    add(bbbbbbbbb.part.moved(Location((-95, 56.4, -0.3))))

    # Cut107: cut Tornillo016
    add(tornillo016_1.part, mode=Mode.SUBTRACT)

    # Cut044: cut Tornillo017
    add(tornillo017_1.part, mode=Mode.SUBTRACT)

    # Cut045: cut Tornillo018
    add(tornillo018_1.part, mode=Mode.SUBTRACT)


with BuildPart() as bbbbbbbbb_2:
    # Cut045 placement: moved
    add(bbbbbbbbb_1.part.moved(Location((0, 0, -0.3))))


with BuildPart() as tornillos051:
    # Sketch075 (on Face6 of Extrude090) → Extrude091 (new body)
    with BuildSketch(Plane.XY.offset(2)):
        with Locations((120, 80.020506)):
            Circle(SKETCH075_R)
        with Locations((120, 45.010253)):
            Circle(SKETCH075_R)
        with Locations((120, 10)):
            Circle(SKETCH075_R)
    extrude(amount=EXTRUDE091_DEPTH)


with BuildPart() as tornillos051_1:
    # Extrude091 placement: moved
    add(tornillos051.part.moved(Location((0, 0, -31))))


with BuildPart() as imprimir:
    # Sketch074 → Extrude090 (new body)
    with BuildSketch(Plane.XY):
        with Locations((65, 45)):
            Rectangle(SKETCH074_W, SKETCH074_H)
    extrude(amount=EXTRUDE090_DEPTH)

    # Cut047: cut Tornillos051
    add(tornillos051_1.part, mode=Mode.SUBTRACT)


with BuildPart() as imprimir_1:
    # Cut047 placement: moved
    add(imprimir.part.moved(Location((-110, 0, 6))))

    # Fusion059: union BBBBBBBBB
    add(bbbbbbbbb_2.part)

    # Fusion060: union Soporte014
    add(soporte014_2.part)

    # Fusion061: union Soporte013
    add(soporte013_2.part)

    # Fusion062: union Cut057
    add(cut057_1.part)

    # Fusion023: union Cut059
    add(cut059_1.part)

    # Fusion024: union Soporte015
    add(soporte015_2.part)

    # Fusion025: union Soporte016
    add(soporte016_2.part)


with BuildPart() as imprimir_2:
    # Fusion025 placement: moved
    add(imprimir_1.part.moved(Location((0, 0, 7.45))))


solid = imprimir_2.part
